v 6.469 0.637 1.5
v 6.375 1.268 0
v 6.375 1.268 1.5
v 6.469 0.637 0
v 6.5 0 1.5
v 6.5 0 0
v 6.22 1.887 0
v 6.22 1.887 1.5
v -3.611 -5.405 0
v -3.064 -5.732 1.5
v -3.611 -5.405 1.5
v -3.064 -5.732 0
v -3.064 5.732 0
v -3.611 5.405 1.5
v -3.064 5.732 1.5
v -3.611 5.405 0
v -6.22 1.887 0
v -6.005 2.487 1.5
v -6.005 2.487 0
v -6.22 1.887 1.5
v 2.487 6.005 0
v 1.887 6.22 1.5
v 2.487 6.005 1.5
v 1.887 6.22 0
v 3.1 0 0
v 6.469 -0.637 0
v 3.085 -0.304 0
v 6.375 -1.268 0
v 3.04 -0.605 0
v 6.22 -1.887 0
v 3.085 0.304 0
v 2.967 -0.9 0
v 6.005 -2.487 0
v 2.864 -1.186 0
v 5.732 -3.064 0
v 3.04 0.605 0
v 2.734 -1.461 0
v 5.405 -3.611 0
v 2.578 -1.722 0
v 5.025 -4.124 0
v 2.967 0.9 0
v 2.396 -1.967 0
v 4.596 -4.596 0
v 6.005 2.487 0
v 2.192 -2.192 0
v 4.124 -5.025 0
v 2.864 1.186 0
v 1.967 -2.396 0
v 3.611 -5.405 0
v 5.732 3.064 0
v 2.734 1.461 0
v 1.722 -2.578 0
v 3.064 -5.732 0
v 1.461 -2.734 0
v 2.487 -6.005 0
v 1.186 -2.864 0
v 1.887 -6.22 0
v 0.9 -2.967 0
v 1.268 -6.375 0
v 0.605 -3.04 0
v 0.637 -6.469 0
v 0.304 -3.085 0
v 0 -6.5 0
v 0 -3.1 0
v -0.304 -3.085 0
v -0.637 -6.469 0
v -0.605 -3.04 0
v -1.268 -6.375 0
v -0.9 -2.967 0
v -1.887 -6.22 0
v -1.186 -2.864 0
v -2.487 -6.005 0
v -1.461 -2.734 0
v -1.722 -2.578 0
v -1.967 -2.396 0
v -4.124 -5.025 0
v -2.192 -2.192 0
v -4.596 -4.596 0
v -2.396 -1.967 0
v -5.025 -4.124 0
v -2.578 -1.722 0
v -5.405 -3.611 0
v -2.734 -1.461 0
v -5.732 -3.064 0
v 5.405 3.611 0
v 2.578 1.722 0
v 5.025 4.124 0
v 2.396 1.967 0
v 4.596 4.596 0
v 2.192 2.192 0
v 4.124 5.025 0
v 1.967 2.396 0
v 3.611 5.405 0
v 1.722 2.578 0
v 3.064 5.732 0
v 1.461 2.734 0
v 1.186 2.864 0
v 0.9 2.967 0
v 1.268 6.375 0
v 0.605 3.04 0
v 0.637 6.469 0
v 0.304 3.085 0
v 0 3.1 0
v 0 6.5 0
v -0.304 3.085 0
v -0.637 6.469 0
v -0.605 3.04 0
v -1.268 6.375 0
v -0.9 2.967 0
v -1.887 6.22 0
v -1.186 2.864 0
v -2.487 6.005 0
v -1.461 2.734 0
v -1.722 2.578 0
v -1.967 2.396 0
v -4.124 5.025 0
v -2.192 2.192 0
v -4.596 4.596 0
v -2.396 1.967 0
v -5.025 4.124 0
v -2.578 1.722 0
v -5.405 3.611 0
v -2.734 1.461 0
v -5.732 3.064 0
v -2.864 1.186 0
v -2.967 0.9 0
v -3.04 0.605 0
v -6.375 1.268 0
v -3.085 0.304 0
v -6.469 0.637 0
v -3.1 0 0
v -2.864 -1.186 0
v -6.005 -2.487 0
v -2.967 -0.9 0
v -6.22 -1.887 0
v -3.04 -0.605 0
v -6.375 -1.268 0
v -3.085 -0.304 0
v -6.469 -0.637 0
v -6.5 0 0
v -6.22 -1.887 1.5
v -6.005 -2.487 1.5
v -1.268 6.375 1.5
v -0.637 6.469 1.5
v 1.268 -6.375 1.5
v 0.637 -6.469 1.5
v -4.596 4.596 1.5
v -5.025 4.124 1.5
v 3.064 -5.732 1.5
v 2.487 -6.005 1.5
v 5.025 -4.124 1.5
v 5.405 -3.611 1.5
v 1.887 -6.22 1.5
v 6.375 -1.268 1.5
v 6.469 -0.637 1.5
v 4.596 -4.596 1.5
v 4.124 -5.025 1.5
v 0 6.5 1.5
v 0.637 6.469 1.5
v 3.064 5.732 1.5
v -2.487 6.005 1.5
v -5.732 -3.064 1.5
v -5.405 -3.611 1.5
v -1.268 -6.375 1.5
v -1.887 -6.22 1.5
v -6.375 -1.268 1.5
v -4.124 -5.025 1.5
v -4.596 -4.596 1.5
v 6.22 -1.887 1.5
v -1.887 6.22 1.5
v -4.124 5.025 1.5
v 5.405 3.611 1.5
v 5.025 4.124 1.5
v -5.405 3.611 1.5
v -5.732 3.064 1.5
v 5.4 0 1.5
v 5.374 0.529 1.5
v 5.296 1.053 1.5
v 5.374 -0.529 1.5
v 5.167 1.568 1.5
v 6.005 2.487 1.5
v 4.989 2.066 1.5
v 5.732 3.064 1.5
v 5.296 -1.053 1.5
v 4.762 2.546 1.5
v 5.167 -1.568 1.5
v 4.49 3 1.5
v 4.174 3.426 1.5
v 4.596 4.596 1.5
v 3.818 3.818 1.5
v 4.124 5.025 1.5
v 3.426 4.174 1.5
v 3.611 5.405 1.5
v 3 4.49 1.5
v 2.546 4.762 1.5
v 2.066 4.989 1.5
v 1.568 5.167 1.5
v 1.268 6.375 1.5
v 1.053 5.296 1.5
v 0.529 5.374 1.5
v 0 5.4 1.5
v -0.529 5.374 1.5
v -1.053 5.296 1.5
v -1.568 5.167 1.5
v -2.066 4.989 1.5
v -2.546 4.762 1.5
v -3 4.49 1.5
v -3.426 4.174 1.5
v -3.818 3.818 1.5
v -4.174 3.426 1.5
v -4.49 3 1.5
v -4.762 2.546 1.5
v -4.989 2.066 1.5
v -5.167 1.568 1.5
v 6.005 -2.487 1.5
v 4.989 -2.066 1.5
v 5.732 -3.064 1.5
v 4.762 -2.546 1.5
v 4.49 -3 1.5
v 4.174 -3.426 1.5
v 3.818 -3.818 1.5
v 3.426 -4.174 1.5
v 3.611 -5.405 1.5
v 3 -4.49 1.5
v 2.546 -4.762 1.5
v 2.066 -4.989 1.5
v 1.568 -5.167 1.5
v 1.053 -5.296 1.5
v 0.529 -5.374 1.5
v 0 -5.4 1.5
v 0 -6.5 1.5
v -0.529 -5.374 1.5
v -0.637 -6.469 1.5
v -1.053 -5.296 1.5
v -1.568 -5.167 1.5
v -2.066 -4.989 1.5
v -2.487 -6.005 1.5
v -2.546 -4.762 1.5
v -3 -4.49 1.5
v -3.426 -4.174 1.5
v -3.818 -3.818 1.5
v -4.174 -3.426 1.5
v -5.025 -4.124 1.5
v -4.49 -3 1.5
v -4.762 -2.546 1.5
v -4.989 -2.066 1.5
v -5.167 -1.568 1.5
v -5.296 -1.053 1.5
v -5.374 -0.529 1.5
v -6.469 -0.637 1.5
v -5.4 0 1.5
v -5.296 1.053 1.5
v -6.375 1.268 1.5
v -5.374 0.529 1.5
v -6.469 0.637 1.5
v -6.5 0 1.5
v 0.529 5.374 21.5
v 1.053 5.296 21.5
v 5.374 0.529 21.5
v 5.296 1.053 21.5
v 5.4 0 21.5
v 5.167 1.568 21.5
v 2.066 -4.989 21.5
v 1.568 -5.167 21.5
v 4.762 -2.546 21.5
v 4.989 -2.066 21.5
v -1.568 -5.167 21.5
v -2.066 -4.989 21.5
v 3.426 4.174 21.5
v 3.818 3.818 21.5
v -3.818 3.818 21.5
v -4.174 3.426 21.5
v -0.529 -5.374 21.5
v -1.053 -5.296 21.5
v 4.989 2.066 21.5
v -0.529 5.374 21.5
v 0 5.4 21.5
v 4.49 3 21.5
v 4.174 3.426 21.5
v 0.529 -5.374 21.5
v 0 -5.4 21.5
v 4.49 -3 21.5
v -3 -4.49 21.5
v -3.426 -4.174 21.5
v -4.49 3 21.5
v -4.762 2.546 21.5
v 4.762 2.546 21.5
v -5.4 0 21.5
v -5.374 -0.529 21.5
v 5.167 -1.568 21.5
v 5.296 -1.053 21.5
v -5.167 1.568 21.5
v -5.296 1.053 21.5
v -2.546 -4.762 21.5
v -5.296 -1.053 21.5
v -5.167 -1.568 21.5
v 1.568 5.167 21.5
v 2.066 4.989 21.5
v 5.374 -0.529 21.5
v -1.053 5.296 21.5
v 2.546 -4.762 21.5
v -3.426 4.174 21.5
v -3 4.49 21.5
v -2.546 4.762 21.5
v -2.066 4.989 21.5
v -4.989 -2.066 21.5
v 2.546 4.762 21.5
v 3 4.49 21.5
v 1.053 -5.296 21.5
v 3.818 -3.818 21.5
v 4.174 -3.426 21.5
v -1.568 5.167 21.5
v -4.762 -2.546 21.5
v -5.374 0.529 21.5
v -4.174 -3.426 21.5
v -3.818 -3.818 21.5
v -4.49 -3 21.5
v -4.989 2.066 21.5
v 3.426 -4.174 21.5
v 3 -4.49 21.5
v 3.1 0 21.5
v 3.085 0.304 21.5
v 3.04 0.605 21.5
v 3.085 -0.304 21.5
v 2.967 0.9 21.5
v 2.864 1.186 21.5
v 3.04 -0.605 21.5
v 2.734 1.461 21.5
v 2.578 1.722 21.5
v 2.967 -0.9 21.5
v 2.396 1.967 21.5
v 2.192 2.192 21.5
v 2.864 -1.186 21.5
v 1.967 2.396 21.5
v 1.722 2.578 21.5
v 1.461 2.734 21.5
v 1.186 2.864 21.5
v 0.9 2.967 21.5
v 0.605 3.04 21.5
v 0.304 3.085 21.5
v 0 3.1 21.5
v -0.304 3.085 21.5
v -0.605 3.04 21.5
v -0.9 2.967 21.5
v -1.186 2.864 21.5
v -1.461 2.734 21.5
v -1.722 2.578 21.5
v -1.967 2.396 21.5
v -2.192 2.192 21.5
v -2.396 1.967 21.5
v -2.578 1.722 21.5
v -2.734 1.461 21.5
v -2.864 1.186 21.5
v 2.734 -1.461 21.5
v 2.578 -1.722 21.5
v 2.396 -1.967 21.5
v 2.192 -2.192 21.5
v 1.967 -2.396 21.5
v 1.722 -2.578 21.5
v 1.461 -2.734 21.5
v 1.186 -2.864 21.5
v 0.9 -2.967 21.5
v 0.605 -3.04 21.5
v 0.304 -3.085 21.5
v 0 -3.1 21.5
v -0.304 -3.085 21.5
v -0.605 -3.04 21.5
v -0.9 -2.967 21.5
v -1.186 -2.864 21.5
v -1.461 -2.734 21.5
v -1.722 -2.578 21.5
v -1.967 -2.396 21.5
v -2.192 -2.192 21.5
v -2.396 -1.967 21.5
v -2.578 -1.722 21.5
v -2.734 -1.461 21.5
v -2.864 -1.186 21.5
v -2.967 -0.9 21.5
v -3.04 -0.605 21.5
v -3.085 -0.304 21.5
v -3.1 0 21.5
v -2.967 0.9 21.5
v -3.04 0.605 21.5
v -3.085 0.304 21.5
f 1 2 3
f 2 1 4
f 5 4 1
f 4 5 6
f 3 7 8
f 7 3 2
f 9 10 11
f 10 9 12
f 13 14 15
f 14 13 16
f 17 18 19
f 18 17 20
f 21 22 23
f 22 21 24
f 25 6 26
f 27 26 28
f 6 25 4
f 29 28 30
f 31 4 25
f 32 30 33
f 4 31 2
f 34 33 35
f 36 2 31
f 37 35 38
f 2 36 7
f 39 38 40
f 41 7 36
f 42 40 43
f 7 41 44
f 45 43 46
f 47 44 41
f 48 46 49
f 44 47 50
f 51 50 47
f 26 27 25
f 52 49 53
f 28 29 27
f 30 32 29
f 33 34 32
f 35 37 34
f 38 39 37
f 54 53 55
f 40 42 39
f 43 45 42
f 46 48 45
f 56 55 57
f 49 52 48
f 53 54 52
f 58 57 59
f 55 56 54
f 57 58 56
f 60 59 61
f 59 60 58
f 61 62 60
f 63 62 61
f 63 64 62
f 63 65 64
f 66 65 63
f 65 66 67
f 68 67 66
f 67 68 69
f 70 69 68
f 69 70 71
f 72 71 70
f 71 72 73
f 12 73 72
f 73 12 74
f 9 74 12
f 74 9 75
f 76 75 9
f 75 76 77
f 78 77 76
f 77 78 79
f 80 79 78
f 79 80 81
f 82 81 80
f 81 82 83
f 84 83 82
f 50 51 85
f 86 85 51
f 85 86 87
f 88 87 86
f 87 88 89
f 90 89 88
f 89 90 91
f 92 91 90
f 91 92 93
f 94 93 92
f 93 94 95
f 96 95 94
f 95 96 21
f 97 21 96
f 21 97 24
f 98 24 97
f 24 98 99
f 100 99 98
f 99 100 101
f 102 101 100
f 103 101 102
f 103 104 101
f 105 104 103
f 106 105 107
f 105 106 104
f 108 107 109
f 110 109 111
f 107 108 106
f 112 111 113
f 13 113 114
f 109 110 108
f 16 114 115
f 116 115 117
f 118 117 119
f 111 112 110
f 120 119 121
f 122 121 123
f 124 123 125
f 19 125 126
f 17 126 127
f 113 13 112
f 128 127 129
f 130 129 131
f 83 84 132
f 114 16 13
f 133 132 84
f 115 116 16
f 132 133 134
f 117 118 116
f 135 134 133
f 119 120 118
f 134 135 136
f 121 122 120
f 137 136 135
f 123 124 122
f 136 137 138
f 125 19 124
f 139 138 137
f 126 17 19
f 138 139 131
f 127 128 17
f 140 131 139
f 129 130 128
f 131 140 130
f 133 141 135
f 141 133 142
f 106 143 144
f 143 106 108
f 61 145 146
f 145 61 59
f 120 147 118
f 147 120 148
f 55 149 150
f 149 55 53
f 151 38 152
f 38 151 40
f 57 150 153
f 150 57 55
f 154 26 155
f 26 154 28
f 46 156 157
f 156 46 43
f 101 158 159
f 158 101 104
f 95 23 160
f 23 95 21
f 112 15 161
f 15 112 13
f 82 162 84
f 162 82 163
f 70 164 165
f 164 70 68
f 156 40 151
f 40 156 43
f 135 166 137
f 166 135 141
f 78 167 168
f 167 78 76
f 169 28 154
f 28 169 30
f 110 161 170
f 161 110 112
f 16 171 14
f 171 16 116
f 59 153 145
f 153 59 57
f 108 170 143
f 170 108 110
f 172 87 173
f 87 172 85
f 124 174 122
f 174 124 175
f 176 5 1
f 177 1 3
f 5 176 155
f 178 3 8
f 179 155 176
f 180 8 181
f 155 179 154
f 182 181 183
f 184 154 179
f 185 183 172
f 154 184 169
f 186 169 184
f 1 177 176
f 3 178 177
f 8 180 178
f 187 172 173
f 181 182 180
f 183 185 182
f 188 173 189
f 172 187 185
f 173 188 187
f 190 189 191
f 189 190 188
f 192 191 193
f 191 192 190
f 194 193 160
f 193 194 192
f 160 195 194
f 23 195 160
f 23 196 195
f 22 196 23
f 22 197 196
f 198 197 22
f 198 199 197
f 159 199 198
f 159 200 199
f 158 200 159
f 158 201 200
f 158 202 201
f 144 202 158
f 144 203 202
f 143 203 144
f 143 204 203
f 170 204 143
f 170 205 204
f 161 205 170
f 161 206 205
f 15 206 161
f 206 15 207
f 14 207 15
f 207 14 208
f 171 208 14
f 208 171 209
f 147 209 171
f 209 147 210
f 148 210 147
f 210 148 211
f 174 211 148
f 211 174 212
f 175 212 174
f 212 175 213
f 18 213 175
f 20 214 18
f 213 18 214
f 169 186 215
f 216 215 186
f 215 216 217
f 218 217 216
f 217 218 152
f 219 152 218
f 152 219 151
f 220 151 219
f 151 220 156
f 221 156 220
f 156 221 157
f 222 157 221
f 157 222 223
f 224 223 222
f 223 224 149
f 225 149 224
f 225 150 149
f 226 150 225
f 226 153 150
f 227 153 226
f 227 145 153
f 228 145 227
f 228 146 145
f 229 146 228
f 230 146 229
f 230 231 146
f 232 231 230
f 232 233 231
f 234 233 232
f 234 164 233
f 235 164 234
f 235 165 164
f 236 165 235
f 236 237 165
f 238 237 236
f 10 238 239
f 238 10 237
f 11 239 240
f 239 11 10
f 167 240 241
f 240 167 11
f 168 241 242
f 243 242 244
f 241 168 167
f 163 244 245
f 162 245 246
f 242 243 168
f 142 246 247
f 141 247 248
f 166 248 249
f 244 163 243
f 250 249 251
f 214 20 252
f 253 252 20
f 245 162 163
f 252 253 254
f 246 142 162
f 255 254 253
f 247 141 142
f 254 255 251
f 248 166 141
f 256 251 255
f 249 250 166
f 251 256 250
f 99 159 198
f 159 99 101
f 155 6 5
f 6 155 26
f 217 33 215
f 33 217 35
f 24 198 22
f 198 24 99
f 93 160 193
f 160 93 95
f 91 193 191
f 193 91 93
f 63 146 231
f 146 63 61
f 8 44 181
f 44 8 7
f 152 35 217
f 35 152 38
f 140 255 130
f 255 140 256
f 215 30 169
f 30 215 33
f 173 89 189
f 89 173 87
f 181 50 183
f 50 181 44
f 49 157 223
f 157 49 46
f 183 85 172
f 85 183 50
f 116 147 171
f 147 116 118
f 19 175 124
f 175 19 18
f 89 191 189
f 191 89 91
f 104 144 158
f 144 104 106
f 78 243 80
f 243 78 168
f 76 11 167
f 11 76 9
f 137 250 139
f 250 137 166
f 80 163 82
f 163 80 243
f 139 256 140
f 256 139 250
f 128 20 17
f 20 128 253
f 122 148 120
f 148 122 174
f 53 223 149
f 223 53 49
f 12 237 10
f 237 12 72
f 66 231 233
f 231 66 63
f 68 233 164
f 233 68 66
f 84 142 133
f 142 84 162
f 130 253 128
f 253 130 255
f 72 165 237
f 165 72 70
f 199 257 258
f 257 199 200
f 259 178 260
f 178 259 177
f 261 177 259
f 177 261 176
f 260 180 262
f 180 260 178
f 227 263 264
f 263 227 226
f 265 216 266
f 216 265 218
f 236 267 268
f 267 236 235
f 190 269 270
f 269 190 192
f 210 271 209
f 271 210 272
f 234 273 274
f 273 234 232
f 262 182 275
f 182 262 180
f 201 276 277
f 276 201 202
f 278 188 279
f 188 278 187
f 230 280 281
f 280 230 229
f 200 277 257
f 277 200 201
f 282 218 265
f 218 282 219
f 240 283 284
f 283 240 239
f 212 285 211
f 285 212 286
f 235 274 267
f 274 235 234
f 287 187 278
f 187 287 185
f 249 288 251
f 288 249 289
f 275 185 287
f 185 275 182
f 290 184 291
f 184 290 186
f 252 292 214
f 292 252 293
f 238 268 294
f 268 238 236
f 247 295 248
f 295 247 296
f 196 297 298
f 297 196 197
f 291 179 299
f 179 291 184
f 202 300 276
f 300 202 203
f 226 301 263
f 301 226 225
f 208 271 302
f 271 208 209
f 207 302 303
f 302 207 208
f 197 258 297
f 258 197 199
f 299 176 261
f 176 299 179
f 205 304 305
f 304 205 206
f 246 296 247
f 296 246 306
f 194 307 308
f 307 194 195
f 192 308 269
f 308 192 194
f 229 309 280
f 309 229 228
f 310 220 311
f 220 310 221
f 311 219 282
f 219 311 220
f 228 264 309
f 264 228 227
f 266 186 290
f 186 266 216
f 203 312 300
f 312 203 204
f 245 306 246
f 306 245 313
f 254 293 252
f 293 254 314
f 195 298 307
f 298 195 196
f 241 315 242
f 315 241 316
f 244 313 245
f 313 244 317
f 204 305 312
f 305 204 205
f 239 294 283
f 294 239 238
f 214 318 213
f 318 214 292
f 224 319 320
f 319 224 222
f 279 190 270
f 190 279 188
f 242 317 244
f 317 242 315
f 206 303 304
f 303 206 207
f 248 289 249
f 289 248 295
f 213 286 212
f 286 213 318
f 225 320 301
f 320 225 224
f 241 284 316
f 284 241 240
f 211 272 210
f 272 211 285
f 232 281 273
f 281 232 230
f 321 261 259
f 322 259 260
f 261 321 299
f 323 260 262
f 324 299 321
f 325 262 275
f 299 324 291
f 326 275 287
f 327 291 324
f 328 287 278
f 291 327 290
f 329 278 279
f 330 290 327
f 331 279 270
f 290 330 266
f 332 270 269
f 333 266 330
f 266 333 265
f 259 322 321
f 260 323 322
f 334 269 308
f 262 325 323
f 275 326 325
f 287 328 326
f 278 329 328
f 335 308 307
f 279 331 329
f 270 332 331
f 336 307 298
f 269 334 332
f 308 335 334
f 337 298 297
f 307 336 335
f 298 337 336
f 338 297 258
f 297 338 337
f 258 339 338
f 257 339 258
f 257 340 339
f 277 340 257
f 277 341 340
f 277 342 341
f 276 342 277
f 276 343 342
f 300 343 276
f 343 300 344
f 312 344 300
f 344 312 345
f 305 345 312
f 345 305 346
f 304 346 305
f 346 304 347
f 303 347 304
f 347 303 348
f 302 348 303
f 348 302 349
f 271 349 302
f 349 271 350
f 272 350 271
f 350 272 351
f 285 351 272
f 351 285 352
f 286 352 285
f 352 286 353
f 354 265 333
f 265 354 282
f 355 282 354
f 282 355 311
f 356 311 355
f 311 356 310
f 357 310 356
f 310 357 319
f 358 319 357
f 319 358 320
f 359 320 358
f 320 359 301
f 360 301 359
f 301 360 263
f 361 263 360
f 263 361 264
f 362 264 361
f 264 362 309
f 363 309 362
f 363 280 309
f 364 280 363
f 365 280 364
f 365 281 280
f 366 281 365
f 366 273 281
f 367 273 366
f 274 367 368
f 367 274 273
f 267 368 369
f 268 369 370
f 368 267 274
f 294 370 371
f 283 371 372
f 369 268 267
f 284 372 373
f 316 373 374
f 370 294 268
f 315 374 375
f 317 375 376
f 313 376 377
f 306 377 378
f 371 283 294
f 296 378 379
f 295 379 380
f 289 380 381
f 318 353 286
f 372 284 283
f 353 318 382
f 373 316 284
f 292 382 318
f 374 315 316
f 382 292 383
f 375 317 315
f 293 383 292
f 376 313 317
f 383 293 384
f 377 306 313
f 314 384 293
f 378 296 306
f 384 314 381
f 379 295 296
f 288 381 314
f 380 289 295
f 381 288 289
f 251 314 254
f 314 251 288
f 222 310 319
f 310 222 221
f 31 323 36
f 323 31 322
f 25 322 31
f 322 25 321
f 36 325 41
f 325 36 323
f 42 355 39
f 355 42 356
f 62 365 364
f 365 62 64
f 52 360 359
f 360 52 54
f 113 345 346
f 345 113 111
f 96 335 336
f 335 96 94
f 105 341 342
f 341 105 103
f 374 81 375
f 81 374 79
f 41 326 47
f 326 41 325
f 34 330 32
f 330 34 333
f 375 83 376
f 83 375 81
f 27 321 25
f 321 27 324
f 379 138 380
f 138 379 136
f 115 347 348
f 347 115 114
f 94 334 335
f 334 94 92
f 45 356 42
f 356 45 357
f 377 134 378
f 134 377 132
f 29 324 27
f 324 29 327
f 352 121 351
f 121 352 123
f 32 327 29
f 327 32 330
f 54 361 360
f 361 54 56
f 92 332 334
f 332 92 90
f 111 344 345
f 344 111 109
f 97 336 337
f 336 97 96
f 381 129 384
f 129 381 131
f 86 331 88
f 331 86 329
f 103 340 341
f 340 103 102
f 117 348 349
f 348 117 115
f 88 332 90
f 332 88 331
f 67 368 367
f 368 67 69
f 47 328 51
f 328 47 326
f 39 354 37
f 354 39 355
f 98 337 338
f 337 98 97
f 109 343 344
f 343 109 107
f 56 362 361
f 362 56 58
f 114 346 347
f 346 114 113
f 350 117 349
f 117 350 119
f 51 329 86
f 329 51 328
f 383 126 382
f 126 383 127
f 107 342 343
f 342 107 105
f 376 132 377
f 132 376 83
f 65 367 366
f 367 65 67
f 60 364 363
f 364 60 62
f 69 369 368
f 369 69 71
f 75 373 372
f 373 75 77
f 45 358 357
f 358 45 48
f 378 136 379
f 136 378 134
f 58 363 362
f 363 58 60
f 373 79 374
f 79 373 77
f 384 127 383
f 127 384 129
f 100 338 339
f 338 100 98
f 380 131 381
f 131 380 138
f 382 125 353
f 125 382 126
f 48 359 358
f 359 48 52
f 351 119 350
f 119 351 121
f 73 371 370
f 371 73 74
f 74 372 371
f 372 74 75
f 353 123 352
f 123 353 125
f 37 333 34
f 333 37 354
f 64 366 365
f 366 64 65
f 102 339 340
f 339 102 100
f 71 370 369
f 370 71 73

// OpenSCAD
// Adapter sleeve for 0.2 mL PCR tube in 1.5 mL rack hole
// All dimensions in millimetres

COLLAR_OD = 13;        // Outer diameter of the base collar
COLLAR_H = 1.5;        // Thickness/height of the base collar
SLEEVE_OD = 10.8;      // Outer diameter of the sleeve body
SLEEVE_H = 20.0;       // Height of the sleeve body (21.5 - 1.5)
BORE_D = 6.2;          // Inner bore diameter for the PCR tube
TOTAL_H = 21.5;        // Total height of the part from bed to top

$fn = 64;

difference() {
    // Main solid body
    union() {
        // Collar resting on the build plate
        cylinder(d = COLLAR_OD, h = COLLAR_H, center = false);
        
        // Sleeve body rising from the collar
        translate([0, 0, COLLAR_H]) {
            cylinder(d = SLEEVE_OD, h = SLEEVE_H, center = false);
        }
    }
    
    // Through-bore for the PCR tube
    // Extends 0.05 mm past z=0 and z=TOTAL_H to avoid coplanar faces
    cylinder(d = BORE_D, h = TOTAL_H + 0.05, center = false);
}
